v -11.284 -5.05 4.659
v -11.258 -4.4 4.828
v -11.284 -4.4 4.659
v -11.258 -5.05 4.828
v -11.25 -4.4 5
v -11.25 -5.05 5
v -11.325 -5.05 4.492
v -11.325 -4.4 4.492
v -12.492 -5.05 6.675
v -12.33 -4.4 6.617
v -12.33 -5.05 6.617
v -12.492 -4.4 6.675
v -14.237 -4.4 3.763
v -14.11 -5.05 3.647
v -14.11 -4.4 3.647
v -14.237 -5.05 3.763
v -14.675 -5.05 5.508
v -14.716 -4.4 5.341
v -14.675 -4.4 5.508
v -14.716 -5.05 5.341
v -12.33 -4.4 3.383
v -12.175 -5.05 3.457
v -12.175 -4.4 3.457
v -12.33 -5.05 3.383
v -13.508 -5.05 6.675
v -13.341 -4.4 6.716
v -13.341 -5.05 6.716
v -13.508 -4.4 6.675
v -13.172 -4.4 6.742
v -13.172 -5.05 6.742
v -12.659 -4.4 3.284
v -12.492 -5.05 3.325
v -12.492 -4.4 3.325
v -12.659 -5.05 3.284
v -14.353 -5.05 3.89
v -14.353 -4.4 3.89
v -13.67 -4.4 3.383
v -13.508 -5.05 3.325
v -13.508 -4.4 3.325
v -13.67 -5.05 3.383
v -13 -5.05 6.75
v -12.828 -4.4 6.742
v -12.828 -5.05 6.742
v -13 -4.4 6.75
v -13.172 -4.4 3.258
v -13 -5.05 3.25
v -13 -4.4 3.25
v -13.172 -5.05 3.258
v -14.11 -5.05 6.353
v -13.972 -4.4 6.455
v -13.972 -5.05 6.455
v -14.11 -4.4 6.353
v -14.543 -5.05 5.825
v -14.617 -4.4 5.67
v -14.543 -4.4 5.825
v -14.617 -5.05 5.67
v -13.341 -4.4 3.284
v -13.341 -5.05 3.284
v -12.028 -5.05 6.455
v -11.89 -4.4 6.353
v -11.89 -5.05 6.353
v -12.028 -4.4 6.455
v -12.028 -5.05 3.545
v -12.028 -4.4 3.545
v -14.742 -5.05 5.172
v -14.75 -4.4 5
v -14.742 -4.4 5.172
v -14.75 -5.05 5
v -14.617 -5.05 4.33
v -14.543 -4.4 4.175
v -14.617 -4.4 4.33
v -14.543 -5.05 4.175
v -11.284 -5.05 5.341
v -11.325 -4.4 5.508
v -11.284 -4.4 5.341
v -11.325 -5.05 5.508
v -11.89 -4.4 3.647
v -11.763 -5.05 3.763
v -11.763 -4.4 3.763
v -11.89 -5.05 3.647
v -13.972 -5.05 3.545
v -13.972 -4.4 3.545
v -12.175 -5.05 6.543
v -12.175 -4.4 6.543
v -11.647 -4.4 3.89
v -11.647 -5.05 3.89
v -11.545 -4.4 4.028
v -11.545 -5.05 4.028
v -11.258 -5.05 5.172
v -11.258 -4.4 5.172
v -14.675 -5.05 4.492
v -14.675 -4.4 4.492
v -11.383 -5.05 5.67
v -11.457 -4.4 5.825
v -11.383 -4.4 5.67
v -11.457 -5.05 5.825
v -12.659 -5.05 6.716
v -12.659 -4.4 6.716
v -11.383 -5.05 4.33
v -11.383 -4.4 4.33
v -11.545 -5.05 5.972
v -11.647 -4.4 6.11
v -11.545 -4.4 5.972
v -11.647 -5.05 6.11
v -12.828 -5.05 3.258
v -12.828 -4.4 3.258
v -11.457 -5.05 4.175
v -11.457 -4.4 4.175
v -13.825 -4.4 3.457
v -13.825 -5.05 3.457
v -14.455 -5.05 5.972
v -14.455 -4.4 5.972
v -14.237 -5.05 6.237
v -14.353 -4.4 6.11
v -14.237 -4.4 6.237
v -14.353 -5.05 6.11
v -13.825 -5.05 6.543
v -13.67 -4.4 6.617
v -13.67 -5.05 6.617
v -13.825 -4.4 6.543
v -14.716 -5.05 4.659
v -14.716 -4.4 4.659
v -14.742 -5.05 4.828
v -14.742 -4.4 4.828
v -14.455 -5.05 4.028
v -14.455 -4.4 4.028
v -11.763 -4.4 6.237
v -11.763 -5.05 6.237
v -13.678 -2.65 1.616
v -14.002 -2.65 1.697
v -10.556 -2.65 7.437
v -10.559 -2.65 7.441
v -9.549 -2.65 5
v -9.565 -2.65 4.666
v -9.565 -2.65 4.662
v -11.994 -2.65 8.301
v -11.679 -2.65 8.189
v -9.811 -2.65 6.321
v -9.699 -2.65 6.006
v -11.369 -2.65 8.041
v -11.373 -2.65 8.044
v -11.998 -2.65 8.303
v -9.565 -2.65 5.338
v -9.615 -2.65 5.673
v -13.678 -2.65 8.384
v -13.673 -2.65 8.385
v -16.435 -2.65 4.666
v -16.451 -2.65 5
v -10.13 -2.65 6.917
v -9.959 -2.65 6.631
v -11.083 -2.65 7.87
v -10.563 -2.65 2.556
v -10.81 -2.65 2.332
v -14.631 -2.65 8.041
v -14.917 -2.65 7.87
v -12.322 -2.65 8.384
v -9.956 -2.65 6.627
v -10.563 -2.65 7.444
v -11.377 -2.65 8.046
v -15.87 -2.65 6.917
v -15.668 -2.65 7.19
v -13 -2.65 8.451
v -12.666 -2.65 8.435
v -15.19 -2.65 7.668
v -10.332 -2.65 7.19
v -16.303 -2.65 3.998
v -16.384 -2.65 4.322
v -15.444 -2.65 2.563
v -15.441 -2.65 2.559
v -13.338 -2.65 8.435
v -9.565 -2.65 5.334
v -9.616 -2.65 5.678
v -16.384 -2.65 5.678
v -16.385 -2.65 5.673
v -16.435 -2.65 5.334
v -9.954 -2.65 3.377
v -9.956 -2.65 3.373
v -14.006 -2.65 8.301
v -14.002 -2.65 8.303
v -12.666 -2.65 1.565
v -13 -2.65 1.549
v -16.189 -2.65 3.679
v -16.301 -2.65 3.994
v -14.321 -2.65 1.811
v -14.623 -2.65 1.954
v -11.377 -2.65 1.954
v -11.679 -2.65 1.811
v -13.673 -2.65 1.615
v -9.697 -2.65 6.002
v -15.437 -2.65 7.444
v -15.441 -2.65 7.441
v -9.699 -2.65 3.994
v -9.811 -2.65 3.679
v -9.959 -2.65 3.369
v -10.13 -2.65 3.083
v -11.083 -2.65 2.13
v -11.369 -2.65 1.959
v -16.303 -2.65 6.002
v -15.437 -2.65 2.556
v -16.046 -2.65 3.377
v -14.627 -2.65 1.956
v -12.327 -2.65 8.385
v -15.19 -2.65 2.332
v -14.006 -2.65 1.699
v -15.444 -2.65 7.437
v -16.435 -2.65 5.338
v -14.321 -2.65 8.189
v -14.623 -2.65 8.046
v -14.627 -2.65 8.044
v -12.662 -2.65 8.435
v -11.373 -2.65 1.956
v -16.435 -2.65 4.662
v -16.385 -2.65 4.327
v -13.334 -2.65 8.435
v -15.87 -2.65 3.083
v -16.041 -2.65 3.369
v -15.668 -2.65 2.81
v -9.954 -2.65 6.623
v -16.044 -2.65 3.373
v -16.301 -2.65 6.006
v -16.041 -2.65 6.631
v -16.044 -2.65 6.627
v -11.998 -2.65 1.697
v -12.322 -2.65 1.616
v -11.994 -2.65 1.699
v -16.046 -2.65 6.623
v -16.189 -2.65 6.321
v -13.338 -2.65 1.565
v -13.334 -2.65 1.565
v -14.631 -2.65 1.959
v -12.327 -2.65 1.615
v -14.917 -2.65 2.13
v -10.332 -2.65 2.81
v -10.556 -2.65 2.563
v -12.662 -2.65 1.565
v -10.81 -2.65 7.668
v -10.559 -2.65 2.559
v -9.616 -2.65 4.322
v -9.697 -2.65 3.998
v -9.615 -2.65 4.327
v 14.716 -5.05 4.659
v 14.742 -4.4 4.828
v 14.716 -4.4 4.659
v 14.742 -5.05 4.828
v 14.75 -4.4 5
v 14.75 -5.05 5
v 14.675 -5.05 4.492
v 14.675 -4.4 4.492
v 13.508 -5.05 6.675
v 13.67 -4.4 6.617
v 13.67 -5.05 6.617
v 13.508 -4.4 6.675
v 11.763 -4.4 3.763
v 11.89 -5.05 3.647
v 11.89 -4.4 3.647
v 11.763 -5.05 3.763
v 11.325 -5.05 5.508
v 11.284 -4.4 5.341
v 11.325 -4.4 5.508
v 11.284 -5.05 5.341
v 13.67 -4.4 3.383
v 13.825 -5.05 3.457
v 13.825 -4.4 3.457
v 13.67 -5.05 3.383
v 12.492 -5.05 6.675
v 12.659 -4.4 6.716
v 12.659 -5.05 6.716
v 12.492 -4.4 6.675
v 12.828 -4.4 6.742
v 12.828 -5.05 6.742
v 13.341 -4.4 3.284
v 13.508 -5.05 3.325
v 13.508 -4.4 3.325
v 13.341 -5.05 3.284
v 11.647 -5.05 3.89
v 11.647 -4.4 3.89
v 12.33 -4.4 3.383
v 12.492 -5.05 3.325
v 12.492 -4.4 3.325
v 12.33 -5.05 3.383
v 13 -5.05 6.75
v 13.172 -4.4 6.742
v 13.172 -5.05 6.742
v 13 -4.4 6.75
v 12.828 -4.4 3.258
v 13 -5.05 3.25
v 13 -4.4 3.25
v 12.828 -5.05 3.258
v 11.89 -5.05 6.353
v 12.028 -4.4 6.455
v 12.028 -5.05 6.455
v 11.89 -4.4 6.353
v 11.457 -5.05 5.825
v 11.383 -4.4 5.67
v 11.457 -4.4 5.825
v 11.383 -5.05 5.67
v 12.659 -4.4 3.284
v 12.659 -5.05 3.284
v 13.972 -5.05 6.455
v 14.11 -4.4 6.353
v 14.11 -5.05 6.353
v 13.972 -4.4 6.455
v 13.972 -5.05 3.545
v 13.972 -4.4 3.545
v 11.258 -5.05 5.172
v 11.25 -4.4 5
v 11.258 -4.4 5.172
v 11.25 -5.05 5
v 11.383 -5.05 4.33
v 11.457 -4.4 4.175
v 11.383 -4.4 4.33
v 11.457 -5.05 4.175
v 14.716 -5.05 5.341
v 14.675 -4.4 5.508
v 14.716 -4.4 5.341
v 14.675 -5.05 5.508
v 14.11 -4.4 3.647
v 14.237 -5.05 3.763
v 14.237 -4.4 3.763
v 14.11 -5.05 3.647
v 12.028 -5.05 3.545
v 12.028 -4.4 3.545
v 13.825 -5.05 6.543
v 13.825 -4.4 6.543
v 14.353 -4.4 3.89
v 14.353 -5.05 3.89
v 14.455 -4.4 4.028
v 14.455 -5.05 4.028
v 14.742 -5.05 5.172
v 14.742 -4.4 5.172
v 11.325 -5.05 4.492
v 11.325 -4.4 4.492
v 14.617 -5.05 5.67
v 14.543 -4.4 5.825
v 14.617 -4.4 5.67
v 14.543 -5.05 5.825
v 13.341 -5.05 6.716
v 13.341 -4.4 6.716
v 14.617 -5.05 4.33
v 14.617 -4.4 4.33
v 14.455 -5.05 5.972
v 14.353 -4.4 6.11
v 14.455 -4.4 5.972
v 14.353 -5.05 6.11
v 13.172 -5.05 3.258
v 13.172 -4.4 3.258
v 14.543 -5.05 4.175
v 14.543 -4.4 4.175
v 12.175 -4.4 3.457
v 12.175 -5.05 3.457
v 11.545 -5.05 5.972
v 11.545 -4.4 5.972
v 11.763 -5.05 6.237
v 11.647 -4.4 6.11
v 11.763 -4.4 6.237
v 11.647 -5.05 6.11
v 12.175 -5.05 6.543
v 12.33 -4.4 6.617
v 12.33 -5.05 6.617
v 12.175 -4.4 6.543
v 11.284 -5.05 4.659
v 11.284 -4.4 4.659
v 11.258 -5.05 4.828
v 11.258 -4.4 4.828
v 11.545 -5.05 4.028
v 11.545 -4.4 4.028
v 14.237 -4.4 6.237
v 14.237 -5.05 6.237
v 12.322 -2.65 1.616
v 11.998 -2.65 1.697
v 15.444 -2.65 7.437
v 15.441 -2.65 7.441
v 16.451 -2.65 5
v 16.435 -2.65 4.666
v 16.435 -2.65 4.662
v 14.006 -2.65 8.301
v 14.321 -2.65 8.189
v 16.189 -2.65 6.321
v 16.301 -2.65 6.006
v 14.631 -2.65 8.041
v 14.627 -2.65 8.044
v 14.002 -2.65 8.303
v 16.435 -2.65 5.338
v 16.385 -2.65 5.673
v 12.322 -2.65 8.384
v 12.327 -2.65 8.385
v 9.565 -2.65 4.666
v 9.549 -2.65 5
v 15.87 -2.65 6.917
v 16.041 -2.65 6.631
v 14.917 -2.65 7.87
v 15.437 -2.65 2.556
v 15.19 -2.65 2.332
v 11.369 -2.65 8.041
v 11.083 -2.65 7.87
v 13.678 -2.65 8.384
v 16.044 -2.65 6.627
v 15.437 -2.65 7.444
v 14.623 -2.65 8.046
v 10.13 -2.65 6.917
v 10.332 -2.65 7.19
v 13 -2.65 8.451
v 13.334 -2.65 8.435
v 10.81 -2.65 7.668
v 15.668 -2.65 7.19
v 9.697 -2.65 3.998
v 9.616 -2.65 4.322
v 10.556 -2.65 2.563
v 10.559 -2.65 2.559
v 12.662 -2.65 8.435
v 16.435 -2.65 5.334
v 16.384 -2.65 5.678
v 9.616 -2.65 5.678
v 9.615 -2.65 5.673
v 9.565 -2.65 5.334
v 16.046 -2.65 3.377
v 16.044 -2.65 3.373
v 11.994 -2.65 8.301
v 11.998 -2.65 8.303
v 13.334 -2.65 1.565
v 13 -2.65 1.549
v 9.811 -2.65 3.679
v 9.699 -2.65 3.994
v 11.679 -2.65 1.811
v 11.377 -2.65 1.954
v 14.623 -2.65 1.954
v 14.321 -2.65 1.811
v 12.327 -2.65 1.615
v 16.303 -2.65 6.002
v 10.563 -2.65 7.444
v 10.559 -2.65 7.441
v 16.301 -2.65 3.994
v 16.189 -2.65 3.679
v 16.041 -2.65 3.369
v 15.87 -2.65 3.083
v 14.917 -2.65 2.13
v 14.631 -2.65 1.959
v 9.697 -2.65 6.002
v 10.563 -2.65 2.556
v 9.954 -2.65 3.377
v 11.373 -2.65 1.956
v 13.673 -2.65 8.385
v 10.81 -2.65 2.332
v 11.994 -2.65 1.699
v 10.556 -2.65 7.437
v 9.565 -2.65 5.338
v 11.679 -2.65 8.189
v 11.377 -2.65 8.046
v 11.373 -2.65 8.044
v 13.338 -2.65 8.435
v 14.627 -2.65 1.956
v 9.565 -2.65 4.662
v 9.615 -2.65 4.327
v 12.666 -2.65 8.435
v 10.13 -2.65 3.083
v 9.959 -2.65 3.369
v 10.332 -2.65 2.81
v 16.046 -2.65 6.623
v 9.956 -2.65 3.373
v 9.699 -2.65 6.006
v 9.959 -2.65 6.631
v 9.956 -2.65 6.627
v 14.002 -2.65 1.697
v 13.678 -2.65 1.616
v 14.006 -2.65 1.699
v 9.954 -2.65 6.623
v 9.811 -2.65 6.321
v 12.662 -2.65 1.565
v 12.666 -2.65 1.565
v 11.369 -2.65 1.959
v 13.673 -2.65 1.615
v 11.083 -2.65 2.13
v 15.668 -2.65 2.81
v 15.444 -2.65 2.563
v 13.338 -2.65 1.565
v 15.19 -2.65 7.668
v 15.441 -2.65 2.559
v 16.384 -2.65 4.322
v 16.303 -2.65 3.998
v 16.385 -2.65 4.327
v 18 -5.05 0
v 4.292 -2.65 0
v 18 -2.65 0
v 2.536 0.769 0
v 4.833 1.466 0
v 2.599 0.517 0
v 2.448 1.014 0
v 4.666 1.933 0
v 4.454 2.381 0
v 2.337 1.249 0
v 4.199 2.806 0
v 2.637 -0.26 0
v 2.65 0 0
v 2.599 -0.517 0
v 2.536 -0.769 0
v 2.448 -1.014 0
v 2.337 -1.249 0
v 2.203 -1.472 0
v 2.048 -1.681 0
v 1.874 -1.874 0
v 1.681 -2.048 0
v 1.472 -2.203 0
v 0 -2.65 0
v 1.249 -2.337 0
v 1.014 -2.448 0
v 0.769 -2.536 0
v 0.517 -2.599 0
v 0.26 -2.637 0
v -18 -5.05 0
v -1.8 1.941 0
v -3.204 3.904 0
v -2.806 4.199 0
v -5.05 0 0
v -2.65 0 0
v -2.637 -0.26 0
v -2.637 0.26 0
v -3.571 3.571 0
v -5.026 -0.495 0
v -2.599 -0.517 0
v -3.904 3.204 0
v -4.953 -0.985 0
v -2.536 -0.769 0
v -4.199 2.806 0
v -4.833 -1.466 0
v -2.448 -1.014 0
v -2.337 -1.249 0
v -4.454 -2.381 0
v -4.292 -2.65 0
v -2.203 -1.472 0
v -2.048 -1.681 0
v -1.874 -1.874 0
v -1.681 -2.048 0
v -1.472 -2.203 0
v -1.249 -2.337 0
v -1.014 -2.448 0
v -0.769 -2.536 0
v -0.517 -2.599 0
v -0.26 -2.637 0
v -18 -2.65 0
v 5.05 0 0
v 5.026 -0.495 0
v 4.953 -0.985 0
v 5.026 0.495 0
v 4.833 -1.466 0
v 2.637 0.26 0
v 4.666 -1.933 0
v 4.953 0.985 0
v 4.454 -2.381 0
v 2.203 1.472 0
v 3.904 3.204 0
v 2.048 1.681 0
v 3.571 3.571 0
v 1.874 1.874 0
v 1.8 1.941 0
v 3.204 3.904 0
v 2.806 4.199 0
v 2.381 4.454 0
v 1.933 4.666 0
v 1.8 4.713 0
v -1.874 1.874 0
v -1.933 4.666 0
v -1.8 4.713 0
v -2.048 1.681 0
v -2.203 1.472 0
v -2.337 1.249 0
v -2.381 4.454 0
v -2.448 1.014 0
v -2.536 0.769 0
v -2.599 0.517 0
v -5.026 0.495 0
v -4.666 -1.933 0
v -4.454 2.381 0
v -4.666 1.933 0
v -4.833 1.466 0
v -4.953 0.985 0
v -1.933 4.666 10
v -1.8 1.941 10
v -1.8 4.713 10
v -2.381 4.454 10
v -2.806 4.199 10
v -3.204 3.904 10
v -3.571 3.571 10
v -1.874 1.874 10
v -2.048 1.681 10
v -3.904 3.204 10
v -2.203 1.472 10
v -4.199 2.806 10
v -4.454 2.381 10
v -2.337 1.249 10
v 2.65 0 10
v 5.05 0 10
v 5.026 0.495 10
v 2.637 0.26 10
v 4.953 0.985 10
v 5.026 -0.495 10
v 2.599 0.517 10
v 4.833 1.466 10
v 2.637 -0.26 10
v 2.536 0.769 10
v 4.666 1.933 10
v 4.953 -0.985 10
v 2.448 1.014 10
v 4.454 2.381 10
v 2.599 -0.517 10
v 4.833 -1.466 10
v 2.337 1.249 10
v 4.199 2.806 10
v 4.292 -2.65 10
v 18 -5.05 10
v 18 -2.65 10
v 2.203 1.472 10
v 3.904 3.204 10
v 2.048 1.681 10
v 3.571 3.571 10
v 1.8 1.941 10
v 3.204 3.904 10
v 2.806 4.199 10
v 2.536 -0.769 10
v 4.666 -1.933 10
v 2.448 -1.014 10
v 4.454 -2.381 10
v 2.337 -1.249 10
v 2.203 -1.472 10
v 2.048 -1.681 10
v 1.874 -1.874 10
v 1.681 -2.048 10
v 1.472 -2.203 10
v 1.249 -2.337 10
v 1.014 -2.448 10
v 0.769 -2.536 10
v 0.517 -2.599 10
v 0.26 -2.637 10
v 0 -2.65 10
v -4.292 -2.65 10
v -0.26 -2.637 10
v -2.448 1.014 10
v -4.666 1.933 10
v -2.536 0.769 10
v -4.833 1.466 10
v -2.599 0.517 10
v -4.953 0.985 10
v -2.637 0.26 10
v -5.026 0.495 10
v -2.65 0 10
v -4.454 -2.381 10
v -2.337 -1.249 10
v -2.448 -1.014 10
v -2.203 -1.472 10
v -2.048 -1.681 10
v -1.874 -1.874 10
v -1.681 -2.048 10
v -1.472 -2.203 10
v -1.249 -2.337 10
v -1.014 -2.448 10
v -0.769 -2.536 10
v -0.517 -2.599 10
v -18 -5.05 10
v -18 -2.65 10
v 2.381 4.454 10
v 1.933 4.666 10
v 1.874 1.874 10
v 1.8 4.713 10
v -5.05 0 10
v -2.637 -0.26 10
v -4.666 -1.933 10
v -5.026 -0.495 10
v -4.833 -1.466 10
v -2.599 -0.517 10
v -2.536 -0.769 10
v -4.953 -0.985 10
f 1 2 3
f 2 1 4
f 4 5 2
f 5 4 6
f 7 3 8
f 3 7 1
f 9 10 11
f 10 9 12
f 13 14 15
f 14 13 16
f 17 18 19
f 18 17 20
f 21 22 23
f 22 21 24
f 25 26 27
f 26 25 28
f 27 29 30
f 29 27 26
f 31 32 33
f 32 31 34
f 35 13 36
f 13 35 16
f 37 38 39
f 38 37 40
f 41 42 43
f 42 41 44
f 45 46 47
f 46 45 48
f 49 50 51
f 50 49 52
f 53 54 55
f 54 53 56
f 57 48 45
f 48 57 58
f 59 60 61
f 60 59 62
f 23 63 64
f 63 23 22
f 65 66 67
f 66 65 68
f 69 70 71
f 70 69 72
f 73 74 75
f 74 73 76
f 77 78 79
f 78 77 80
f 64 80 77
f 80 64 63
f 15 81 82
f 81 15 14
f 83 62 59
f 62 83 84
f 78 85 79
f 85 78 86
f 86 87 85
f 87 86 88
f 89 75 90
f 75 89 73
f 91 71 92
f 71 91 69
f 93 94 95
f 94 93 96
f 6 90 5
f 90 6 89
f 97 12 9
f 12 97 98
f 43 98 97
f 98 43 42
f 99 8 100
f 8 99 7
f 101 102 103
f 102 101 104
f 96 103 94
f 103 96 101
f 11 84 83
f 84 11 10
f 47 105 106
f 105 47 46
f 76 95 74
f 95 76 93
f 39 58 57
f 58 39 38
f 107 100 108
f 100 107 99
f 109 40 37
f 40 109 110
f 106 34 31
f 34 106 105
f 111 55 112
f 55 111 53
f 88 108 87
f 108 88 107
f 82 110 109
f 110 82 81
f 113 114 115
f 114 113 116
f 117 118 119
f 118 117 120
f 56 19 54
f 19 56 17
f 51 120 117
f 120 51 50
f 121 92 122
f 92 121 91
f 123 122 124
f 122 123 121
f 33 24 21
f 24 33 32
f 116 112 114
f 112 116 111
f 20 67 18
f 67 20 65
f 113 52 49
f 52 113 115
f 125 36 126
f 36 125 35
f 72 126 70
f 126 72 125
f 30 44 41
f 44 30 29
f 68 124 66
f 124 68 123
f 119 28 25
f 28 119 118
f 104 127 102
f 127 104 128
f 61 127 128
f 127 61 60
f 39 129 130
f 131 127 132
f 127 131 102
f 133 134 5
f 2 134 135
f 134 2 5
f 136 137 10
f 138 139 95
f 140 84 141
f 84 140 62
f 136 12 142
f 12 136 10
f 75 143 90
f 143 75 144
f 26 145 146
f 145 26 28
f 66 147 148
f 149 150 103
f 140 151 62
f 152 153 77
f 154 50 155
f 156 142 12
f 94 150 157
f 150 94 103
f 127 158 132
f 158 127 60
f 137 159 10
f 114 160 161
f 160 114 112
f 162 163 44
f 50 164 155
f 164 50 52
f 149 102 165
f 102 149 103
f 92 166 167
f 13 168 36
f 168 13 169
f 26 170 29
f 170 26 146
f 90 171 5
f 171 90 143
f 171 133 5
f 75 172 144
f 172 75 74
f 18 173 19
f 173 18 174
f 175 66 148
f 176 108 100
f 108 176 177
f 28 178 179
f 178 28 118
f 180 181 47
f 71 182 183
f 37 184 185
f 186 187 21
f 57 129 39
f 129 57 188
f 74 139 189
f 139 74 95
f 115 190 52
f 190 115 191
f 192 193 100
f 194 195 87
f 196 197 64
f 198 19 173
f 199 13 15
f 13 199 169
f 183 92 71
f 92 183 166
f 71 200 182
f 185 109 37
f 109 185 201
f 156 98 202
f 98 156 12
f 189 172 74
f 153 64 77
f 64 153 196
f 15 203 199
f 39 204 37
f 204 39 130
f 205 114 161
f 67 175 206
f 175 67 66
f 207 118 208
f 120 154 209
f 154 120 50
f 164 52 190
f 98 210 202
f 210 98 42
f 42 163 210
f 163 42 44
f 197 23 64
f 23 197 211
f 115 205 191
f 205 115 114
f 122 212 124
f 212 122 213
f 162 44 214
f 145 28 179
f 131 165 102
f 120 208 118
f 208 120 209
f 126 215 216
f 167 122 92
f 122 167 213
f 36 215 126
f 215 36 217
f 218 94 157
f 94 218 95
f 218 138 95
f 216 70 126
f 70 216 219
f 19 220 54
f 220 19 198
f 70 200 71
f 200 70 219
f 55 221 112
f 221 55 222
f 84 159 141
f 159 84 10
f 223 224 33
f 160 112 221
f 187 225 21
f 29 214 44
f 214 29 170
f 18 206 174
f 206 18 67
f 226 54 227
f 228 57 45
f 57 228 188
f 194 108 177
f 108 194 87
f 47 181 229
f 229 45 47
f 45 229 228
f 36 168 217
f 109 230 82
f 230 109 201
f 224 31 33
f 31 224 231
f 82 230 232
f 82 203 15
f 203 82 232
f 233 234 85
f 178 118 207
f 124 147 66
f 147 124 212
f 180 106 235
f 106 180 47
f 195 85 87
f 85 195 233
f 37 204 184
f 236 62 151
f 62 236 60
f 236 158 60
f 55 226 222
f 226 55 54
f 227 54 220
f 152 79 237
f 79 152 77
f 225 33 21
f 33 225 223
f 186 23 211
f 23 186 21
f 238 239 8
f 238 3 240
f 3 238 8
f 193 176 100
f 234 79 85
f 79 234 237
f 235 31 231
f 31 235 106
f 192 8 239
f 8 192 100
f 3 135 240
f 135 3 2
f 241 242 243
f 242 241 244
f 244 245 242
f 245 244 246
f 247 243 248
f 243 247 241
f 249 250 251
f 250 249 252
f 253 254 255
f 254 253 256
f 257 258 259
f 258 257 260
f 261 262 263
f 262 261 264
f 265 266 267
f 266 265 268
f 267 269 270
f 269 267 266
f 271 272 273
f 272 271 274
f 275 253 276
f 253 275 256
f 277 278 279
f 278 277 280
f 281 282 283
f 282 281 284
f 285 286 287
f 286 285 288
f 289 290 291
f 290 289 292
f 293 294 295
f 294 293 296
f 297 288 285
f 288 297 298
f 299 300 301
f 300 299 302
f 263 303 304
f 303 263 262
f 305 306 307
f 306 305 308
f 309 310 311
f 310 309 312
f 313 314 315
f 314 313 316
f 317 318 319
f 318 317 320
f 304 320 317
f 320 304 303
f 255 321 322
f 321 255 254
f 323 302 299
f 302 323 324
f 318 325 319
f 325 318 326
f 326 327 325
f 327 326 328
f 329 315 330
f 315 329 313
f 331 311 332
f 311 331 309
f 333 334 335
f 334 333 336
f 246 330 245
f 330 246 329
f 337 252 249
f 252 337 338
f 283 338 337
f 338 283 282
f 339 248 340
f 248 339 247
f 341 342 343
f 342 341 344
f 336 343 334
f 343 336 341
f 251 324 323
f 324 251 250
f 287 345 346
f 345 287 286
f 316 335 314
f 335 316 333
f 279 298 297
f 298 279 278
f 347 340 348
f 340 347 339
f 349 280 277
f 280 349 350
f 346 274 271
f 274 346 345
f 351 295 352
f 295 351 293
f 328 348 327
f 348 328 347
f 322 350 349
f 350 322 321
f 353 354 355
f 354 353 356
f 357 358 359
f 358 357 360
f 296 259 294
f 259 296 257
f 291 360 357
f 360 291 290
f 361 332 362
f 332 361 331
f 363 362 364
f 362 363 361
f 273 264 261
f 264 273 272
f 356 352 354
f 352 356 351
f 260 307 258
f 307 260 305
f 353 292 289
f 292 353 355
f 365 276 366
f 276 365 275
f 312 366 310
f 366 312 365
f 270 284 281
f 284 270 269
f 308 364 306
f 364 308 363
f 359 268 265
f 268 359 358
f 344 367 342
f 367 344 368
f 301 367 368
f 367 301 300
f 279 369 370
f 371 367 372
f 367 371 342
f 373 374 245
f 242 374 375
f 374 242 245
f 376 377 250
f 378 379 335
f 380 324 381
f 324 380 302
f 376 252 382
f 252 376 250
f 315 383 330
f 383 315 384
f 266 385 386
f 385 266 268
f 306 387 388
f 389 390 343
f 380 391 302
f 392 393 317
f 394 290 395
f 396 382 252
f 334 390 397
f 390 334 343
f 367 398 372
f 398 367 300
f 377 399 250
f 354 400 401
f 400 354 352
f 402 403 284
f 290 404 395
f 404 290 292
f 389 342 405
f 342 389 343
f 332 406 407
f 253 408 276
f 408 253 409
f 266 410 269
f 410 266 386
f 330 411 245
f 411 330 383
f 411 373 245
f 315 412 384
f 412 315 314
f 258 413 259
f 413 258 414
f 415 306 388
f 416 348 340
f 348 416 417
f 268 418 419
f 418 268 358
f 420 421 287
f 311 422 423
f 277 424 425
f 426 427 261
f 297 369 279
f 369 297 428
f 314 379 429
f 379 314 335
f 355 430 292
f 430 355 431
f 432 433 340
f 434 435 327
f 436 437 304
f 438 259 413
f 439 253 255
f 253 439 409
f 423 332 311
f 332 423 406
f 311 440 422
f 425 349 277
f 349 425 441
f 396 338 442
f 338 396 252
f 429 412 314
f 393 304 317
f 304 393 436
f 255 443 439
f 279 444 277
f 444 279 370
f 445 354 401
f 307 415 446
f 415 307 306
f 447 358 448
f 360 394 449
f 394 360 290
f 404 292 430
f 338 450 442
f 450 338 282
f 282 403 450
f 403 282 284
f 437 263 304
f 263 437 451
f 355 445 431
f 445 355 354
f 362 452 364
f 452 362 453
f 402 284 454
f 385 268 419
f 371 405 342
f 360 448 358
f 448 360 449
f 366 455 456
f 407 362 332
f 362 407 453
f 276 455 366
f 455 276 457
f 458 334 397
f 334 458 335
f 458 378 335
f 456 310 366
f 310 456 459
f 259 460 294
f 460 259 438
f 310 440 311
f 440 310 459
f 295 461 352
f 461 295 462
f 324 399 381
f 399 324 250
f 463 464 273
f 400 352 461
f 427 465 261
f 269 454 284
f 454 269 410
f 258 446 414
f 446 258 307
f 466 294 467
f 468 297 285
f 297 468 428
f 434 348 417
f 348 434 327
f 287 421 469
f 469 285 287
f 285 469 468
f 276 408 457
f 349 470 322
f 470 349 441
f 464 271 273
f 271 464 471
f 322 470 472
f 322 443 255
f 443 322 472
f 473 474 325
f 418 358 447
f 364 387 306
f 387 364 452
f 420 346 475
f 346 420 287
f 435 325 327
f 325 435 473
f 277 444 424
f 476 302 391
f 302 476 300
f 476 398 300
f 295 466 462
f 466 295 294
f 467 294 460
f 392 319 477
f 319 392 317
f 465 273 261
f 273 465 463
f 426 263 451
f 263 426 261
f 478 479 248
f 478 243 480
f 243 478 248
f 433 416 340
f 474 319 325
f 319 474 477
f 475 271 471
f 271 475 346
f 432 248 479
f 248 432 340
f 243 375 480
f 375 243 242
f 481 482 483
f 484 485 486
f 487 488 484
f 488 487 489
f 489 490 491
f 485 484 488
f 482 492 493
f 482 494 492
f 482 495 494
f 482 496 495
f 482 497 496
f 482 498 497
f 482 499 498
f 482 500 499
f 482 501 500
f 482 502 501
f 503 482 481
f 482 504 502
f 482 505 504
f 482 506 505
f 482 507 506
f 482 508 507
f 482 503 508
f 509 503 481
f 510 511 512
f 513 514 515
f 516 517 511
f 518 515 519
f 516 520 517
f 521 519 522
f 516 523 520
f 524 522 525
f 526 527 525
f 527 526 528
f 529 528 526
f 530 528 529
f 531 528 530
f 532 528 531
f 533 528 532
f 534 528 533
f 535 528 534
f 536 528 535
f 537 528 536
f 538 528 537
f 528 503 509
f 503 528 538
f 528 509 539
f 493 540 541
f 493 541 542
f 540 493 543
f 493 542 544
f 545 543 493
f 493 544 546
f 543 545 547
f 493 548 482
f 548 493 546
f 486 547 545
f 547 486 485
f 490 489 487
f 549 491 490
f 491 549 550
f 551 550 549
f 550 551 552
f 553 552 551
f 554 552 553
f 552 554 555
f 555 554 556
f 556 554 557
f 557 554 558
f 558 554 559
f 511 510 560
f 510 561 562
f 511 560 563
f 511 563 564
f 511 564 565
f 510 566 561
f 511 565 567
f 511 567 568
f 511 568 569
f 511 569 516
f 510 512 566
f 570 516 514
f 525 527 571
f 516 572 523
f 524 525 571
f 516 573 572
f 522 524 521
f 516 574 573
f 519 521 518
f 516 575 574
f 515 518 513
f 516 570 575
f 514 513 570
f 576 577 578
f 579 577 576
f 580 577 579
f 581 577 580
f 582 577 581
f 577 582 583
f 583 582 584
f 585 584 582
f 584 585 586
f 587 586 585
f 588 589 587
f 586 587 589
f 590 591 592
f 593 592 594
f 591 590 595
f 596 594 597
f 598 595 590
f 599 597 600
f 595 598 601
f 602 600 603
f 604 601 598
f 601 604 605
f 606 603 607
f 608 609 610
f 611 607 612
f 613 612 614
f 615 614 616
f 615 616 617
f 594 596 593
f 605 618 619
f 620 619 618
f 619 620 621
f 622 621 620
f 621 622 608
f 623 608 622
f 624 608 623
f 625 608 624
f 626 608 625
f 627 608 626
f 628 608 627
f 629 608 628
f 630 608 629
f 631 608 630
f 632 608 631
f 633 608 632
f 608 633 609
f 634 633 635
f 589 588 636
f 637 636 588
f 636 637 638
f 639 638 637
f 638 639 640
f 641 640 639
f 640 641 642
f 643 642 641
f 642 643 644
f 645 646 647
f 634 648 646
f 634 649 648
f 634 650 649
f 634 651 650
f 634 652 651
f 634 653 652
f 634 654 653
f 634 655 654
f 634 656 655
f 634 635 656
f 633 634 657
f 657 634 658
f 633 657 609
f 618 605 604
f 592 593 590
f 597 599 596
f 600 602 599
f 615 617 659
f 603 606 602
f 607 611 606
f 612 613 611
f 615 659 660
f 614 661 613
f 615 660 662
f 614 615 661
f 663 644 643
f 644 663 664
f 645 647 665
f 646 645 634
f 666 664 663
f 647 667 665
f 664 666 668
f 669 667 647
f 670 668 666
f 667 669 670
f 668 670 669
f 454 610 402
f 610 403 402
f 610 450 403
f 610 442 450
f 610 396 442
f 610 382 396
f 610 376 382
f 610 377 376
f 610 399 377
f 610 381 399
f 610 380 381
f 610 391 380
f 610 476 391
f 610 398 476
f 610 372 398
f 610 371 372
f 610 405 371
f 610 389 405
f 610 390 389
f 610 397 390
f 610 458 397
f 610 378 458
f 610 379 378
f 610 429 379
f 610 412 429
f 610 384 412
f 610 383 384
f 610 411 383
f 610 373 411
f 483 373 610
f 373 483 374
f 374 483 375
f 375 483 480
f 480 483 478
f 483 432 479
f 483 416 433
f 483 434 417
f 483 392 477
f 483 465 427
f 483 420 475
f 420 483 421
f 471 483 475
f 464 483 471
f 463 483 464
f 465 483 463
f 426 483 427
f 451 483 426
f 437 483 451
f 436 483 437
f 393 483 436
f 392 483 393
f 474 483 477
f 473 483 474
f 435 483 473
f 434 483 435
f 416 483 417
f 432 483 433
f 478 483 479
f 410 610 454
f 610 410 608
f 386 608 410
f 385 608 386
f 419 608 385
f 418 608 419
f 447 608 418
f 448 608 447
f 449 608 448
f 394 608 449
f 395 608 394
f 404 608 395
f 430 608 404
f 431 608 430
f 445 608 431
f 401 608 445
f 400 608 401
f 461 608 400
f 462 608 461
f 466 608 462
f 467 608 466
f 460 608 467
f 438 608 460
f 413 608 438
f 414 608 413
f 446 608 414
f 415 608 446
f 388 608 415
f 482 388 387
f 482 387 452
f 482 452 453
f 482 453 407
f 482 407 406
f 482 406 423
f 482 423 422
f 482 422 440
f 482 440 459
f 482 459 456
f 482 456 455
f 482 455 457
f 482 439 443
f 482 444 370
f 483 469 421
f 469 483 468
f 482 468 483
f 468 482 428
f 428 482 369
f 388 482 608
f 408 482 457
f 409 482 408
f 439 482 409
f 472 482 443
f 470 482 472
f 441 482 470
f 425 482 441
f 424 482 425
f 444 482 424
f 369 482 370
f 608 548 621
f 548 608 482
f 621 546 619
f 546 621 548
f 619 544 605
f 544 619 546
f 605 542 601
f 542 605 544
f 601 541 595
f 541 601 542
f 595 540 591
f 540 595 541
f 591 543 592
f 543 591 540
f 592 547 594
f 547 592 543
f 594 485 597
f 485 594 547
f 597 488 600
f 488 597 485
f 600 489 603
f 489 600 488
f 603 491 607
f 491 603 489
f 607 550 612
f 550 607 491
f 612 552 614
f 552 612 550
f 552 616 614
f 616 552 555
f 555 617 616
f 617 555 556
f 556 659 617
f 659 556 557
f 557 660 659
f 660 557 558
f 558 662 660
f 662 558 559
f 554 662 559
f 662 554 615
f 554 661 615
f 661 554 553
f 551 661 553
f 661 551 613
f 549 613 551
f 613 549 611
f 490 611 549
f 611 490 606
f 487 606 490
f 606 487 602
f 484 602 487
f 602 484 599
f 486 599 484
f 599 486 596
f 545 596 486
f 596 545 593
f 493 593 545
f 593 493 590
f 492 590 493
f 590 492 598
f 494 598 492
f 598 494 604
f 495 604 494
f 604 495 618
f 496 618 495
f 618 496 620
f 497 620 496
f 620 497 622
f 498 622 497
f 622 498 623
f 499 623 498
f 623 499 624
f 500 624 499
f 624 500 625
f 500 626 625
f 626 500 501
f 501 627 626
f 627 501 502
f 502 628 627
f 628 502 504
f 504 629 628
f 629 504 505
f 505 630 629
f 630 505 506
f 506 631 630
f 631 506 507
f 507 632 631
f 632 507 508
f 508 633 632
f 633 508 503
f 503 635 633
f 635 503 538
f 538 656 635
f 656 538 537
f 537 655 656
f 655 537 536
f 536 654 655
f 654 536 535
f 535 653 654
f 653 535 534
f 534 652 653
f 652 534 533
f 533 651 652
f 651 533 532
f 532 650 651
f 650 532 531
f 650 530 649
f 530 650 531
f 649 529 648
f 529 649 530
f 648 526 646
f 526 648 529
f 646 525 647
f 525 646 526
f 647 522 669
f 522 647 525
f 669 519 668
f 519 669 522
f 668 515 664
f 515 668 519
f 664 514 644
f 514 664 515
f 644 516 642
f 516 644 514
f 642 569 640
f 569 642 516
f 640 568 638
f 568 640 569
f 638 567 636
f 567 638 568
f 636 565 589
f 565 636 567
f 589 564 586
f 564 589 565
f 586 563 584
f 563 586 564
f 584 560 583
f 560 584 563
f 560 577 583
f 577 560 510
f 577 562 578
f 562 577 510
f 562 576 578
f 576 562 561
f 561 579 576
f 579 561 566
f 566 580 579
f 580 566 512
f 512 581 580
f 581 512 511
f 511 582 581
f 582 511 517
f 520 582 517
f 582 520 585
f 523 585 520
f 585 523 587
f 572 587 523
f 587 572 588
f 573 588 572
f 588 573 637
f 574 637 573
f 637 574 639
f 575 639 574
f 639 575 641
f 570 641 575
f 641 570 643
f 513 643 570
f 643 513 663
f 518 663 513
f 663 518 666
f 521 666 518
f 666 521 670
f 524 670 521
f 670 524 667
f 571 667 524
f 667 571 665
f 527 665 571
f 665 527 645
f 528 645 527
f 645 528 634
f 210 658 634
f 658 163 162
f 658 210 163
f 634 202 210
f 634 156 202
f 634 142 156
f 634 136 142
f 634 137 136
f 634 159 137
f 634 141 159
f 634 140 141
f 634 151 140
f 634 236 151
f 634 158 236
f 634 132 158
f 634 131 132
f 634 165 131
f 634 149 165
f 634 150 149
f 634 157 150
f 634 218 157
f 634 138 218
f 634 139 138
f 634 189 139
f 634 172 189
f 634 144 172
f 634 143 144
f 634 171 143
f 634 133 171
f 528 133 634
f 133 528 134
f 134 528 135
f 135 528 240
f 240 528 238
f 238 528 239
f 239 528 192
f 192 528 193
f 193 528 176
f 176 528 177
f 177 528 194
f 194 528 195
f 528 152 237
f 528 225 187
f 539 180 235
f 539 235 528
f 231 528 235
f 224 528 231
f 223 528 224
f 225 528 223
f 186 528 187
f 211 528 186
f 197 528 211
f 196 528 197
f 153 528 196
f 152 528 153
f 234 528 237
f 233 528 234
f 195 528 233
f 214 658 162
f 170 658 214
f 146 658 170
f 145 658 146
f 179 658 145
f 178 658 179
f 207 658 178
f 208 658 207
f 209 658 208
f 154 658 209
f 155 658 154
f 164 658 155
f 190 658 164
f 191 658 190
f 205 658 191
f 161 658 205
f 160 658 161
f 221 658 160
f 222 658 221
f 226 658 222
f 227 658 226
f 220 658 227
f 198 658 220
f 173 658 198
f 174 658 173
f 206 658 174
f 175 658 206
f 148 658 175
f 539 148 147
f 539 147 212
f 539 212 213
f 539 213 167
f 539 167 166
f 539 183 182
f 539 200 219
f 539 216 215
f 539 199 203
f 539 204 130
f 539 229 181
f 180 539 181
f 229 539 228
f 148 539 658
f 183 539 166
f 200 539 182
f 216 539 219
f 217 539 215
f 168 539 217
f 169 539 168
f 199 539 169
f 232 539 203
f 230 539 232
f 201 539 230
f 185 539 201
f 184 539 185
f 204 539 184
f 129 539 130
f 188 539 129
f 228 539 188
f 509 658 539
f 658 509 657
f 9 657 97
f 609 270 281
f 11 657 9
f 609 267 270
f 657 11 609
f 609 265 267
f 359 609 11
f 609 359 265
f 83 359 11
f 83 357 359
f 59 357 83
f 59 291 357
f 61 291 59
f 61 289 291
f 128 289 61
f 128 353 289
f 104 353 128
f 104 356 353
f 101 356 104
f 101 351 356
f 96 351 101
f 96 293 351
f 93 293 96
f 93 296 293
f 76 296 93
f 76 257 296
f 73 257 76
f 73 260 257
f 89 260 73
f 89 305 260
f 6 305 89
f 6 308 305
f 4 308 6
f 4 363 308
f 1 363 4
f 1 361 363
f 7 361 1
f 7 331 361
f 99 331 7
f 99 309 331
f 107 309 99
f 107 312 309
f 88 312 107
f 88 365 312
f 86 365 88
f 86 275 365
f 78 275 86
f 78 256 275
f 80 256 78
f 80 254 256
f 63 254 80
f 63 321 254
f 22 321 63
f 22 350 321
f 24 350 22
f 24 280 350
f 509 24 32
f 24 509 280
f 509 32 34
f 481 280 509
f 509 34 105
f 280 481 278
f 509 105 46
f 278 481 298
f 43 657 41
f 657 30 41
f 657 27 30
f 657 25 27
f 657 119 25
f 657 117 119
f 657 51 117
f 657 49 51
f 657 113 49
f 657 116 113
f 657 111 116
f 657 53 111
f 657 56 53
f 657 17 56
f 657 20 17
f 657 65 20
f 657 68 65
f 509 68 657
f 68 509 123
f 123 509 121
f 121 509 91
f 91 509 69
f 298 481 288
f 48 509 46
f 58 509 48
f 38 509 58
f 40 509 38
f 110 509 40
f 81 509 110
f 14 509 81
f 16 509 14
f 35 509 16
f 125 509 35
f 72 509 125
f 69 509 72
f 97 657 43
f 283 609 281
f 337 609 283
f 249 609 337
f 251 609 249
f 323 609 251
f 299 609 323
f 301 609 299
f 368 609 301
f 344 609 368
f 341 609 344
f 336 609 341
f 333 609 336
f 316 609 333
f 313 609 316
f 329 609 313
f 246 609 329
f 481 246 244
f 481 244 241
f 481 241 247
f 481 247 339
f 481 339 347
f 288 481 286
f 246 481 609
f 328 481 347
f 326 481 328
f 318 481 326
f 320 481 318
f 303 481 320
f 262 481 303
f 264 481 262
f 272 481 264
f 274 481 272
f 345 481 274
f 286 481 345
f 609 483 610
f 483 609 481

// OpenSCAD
// ---------------------------------------------------------------
// cable_clip.scad  -  screw-on cable clip, prints flat with no supports
// Used in: Level 1 exercise L1-9, Level 2 exercise L2-14 (variant)
//
// A C-shaped ring holds a cable; a flat foot carries two countersunk
// screw holes.  The ring axis is vertical (Z) so the part prints flat on
// the bed with no supports.  Set `cable_d` to your cable diameter and
// keep `opening` a bit smaller than the cable so it snaps in.
// Units: millimeters.
// ---------------------------------------------------------------

cable_d    = 5;      // cable diameter
fit        = 0.3;    // extra clearance added to the cable diameter
wall       = 2.4;    // wall thickness of the ring and the foot
opening    = 3.6;    // width of the slot; < cable_d for a snap-in grip
width      = 10;     // clip height (Z), the dimension along the cable
foot_w     = 36;     // total width of the foot
screw_d    = 3.5;    // screw clearance hole diameter
head_d     = 7;      // countersink head diameter
$fn        = 64;

inner_r = (cable_d + fit) / 2;
outer_r = inner_r + wall;

// 2D profile in X-Y: ring on top of a foot whose bottom is at y = -outer_r
module profile() {
    difference() {
        union() {
            circle(r = outer_r);
            translate([-foot_w / 2, -outer_r]) square([foot_w, wall]);
        }
        circle(r = inner_r);
        // slot opening toward +Y
        translate([-opening / 2, 0]) square([opening, outer_r + 1]);
    }
}

difference() {
    linear_extrude(width) profile();
    // two countersunk screw holes through the foot (axis along Y)
    for (sx = [-1, 1])
        translate([sx * (foot_w / 2 - 5), -outer_r - 0.1, width / 2])
            rotate([-90, 0, 0]) {
                cylinder(d = screw_d, h = wall + 0.2);
                // countersink opens on the +Y side of the foot
                translate([0, 0, wall - (head_d - screw_d) / 2 + 0.1])
                    cylinder(d1 = screw_d, d2 = head_d, h = (head_d - screw_d) / 2 + 0.05);
            }
}
